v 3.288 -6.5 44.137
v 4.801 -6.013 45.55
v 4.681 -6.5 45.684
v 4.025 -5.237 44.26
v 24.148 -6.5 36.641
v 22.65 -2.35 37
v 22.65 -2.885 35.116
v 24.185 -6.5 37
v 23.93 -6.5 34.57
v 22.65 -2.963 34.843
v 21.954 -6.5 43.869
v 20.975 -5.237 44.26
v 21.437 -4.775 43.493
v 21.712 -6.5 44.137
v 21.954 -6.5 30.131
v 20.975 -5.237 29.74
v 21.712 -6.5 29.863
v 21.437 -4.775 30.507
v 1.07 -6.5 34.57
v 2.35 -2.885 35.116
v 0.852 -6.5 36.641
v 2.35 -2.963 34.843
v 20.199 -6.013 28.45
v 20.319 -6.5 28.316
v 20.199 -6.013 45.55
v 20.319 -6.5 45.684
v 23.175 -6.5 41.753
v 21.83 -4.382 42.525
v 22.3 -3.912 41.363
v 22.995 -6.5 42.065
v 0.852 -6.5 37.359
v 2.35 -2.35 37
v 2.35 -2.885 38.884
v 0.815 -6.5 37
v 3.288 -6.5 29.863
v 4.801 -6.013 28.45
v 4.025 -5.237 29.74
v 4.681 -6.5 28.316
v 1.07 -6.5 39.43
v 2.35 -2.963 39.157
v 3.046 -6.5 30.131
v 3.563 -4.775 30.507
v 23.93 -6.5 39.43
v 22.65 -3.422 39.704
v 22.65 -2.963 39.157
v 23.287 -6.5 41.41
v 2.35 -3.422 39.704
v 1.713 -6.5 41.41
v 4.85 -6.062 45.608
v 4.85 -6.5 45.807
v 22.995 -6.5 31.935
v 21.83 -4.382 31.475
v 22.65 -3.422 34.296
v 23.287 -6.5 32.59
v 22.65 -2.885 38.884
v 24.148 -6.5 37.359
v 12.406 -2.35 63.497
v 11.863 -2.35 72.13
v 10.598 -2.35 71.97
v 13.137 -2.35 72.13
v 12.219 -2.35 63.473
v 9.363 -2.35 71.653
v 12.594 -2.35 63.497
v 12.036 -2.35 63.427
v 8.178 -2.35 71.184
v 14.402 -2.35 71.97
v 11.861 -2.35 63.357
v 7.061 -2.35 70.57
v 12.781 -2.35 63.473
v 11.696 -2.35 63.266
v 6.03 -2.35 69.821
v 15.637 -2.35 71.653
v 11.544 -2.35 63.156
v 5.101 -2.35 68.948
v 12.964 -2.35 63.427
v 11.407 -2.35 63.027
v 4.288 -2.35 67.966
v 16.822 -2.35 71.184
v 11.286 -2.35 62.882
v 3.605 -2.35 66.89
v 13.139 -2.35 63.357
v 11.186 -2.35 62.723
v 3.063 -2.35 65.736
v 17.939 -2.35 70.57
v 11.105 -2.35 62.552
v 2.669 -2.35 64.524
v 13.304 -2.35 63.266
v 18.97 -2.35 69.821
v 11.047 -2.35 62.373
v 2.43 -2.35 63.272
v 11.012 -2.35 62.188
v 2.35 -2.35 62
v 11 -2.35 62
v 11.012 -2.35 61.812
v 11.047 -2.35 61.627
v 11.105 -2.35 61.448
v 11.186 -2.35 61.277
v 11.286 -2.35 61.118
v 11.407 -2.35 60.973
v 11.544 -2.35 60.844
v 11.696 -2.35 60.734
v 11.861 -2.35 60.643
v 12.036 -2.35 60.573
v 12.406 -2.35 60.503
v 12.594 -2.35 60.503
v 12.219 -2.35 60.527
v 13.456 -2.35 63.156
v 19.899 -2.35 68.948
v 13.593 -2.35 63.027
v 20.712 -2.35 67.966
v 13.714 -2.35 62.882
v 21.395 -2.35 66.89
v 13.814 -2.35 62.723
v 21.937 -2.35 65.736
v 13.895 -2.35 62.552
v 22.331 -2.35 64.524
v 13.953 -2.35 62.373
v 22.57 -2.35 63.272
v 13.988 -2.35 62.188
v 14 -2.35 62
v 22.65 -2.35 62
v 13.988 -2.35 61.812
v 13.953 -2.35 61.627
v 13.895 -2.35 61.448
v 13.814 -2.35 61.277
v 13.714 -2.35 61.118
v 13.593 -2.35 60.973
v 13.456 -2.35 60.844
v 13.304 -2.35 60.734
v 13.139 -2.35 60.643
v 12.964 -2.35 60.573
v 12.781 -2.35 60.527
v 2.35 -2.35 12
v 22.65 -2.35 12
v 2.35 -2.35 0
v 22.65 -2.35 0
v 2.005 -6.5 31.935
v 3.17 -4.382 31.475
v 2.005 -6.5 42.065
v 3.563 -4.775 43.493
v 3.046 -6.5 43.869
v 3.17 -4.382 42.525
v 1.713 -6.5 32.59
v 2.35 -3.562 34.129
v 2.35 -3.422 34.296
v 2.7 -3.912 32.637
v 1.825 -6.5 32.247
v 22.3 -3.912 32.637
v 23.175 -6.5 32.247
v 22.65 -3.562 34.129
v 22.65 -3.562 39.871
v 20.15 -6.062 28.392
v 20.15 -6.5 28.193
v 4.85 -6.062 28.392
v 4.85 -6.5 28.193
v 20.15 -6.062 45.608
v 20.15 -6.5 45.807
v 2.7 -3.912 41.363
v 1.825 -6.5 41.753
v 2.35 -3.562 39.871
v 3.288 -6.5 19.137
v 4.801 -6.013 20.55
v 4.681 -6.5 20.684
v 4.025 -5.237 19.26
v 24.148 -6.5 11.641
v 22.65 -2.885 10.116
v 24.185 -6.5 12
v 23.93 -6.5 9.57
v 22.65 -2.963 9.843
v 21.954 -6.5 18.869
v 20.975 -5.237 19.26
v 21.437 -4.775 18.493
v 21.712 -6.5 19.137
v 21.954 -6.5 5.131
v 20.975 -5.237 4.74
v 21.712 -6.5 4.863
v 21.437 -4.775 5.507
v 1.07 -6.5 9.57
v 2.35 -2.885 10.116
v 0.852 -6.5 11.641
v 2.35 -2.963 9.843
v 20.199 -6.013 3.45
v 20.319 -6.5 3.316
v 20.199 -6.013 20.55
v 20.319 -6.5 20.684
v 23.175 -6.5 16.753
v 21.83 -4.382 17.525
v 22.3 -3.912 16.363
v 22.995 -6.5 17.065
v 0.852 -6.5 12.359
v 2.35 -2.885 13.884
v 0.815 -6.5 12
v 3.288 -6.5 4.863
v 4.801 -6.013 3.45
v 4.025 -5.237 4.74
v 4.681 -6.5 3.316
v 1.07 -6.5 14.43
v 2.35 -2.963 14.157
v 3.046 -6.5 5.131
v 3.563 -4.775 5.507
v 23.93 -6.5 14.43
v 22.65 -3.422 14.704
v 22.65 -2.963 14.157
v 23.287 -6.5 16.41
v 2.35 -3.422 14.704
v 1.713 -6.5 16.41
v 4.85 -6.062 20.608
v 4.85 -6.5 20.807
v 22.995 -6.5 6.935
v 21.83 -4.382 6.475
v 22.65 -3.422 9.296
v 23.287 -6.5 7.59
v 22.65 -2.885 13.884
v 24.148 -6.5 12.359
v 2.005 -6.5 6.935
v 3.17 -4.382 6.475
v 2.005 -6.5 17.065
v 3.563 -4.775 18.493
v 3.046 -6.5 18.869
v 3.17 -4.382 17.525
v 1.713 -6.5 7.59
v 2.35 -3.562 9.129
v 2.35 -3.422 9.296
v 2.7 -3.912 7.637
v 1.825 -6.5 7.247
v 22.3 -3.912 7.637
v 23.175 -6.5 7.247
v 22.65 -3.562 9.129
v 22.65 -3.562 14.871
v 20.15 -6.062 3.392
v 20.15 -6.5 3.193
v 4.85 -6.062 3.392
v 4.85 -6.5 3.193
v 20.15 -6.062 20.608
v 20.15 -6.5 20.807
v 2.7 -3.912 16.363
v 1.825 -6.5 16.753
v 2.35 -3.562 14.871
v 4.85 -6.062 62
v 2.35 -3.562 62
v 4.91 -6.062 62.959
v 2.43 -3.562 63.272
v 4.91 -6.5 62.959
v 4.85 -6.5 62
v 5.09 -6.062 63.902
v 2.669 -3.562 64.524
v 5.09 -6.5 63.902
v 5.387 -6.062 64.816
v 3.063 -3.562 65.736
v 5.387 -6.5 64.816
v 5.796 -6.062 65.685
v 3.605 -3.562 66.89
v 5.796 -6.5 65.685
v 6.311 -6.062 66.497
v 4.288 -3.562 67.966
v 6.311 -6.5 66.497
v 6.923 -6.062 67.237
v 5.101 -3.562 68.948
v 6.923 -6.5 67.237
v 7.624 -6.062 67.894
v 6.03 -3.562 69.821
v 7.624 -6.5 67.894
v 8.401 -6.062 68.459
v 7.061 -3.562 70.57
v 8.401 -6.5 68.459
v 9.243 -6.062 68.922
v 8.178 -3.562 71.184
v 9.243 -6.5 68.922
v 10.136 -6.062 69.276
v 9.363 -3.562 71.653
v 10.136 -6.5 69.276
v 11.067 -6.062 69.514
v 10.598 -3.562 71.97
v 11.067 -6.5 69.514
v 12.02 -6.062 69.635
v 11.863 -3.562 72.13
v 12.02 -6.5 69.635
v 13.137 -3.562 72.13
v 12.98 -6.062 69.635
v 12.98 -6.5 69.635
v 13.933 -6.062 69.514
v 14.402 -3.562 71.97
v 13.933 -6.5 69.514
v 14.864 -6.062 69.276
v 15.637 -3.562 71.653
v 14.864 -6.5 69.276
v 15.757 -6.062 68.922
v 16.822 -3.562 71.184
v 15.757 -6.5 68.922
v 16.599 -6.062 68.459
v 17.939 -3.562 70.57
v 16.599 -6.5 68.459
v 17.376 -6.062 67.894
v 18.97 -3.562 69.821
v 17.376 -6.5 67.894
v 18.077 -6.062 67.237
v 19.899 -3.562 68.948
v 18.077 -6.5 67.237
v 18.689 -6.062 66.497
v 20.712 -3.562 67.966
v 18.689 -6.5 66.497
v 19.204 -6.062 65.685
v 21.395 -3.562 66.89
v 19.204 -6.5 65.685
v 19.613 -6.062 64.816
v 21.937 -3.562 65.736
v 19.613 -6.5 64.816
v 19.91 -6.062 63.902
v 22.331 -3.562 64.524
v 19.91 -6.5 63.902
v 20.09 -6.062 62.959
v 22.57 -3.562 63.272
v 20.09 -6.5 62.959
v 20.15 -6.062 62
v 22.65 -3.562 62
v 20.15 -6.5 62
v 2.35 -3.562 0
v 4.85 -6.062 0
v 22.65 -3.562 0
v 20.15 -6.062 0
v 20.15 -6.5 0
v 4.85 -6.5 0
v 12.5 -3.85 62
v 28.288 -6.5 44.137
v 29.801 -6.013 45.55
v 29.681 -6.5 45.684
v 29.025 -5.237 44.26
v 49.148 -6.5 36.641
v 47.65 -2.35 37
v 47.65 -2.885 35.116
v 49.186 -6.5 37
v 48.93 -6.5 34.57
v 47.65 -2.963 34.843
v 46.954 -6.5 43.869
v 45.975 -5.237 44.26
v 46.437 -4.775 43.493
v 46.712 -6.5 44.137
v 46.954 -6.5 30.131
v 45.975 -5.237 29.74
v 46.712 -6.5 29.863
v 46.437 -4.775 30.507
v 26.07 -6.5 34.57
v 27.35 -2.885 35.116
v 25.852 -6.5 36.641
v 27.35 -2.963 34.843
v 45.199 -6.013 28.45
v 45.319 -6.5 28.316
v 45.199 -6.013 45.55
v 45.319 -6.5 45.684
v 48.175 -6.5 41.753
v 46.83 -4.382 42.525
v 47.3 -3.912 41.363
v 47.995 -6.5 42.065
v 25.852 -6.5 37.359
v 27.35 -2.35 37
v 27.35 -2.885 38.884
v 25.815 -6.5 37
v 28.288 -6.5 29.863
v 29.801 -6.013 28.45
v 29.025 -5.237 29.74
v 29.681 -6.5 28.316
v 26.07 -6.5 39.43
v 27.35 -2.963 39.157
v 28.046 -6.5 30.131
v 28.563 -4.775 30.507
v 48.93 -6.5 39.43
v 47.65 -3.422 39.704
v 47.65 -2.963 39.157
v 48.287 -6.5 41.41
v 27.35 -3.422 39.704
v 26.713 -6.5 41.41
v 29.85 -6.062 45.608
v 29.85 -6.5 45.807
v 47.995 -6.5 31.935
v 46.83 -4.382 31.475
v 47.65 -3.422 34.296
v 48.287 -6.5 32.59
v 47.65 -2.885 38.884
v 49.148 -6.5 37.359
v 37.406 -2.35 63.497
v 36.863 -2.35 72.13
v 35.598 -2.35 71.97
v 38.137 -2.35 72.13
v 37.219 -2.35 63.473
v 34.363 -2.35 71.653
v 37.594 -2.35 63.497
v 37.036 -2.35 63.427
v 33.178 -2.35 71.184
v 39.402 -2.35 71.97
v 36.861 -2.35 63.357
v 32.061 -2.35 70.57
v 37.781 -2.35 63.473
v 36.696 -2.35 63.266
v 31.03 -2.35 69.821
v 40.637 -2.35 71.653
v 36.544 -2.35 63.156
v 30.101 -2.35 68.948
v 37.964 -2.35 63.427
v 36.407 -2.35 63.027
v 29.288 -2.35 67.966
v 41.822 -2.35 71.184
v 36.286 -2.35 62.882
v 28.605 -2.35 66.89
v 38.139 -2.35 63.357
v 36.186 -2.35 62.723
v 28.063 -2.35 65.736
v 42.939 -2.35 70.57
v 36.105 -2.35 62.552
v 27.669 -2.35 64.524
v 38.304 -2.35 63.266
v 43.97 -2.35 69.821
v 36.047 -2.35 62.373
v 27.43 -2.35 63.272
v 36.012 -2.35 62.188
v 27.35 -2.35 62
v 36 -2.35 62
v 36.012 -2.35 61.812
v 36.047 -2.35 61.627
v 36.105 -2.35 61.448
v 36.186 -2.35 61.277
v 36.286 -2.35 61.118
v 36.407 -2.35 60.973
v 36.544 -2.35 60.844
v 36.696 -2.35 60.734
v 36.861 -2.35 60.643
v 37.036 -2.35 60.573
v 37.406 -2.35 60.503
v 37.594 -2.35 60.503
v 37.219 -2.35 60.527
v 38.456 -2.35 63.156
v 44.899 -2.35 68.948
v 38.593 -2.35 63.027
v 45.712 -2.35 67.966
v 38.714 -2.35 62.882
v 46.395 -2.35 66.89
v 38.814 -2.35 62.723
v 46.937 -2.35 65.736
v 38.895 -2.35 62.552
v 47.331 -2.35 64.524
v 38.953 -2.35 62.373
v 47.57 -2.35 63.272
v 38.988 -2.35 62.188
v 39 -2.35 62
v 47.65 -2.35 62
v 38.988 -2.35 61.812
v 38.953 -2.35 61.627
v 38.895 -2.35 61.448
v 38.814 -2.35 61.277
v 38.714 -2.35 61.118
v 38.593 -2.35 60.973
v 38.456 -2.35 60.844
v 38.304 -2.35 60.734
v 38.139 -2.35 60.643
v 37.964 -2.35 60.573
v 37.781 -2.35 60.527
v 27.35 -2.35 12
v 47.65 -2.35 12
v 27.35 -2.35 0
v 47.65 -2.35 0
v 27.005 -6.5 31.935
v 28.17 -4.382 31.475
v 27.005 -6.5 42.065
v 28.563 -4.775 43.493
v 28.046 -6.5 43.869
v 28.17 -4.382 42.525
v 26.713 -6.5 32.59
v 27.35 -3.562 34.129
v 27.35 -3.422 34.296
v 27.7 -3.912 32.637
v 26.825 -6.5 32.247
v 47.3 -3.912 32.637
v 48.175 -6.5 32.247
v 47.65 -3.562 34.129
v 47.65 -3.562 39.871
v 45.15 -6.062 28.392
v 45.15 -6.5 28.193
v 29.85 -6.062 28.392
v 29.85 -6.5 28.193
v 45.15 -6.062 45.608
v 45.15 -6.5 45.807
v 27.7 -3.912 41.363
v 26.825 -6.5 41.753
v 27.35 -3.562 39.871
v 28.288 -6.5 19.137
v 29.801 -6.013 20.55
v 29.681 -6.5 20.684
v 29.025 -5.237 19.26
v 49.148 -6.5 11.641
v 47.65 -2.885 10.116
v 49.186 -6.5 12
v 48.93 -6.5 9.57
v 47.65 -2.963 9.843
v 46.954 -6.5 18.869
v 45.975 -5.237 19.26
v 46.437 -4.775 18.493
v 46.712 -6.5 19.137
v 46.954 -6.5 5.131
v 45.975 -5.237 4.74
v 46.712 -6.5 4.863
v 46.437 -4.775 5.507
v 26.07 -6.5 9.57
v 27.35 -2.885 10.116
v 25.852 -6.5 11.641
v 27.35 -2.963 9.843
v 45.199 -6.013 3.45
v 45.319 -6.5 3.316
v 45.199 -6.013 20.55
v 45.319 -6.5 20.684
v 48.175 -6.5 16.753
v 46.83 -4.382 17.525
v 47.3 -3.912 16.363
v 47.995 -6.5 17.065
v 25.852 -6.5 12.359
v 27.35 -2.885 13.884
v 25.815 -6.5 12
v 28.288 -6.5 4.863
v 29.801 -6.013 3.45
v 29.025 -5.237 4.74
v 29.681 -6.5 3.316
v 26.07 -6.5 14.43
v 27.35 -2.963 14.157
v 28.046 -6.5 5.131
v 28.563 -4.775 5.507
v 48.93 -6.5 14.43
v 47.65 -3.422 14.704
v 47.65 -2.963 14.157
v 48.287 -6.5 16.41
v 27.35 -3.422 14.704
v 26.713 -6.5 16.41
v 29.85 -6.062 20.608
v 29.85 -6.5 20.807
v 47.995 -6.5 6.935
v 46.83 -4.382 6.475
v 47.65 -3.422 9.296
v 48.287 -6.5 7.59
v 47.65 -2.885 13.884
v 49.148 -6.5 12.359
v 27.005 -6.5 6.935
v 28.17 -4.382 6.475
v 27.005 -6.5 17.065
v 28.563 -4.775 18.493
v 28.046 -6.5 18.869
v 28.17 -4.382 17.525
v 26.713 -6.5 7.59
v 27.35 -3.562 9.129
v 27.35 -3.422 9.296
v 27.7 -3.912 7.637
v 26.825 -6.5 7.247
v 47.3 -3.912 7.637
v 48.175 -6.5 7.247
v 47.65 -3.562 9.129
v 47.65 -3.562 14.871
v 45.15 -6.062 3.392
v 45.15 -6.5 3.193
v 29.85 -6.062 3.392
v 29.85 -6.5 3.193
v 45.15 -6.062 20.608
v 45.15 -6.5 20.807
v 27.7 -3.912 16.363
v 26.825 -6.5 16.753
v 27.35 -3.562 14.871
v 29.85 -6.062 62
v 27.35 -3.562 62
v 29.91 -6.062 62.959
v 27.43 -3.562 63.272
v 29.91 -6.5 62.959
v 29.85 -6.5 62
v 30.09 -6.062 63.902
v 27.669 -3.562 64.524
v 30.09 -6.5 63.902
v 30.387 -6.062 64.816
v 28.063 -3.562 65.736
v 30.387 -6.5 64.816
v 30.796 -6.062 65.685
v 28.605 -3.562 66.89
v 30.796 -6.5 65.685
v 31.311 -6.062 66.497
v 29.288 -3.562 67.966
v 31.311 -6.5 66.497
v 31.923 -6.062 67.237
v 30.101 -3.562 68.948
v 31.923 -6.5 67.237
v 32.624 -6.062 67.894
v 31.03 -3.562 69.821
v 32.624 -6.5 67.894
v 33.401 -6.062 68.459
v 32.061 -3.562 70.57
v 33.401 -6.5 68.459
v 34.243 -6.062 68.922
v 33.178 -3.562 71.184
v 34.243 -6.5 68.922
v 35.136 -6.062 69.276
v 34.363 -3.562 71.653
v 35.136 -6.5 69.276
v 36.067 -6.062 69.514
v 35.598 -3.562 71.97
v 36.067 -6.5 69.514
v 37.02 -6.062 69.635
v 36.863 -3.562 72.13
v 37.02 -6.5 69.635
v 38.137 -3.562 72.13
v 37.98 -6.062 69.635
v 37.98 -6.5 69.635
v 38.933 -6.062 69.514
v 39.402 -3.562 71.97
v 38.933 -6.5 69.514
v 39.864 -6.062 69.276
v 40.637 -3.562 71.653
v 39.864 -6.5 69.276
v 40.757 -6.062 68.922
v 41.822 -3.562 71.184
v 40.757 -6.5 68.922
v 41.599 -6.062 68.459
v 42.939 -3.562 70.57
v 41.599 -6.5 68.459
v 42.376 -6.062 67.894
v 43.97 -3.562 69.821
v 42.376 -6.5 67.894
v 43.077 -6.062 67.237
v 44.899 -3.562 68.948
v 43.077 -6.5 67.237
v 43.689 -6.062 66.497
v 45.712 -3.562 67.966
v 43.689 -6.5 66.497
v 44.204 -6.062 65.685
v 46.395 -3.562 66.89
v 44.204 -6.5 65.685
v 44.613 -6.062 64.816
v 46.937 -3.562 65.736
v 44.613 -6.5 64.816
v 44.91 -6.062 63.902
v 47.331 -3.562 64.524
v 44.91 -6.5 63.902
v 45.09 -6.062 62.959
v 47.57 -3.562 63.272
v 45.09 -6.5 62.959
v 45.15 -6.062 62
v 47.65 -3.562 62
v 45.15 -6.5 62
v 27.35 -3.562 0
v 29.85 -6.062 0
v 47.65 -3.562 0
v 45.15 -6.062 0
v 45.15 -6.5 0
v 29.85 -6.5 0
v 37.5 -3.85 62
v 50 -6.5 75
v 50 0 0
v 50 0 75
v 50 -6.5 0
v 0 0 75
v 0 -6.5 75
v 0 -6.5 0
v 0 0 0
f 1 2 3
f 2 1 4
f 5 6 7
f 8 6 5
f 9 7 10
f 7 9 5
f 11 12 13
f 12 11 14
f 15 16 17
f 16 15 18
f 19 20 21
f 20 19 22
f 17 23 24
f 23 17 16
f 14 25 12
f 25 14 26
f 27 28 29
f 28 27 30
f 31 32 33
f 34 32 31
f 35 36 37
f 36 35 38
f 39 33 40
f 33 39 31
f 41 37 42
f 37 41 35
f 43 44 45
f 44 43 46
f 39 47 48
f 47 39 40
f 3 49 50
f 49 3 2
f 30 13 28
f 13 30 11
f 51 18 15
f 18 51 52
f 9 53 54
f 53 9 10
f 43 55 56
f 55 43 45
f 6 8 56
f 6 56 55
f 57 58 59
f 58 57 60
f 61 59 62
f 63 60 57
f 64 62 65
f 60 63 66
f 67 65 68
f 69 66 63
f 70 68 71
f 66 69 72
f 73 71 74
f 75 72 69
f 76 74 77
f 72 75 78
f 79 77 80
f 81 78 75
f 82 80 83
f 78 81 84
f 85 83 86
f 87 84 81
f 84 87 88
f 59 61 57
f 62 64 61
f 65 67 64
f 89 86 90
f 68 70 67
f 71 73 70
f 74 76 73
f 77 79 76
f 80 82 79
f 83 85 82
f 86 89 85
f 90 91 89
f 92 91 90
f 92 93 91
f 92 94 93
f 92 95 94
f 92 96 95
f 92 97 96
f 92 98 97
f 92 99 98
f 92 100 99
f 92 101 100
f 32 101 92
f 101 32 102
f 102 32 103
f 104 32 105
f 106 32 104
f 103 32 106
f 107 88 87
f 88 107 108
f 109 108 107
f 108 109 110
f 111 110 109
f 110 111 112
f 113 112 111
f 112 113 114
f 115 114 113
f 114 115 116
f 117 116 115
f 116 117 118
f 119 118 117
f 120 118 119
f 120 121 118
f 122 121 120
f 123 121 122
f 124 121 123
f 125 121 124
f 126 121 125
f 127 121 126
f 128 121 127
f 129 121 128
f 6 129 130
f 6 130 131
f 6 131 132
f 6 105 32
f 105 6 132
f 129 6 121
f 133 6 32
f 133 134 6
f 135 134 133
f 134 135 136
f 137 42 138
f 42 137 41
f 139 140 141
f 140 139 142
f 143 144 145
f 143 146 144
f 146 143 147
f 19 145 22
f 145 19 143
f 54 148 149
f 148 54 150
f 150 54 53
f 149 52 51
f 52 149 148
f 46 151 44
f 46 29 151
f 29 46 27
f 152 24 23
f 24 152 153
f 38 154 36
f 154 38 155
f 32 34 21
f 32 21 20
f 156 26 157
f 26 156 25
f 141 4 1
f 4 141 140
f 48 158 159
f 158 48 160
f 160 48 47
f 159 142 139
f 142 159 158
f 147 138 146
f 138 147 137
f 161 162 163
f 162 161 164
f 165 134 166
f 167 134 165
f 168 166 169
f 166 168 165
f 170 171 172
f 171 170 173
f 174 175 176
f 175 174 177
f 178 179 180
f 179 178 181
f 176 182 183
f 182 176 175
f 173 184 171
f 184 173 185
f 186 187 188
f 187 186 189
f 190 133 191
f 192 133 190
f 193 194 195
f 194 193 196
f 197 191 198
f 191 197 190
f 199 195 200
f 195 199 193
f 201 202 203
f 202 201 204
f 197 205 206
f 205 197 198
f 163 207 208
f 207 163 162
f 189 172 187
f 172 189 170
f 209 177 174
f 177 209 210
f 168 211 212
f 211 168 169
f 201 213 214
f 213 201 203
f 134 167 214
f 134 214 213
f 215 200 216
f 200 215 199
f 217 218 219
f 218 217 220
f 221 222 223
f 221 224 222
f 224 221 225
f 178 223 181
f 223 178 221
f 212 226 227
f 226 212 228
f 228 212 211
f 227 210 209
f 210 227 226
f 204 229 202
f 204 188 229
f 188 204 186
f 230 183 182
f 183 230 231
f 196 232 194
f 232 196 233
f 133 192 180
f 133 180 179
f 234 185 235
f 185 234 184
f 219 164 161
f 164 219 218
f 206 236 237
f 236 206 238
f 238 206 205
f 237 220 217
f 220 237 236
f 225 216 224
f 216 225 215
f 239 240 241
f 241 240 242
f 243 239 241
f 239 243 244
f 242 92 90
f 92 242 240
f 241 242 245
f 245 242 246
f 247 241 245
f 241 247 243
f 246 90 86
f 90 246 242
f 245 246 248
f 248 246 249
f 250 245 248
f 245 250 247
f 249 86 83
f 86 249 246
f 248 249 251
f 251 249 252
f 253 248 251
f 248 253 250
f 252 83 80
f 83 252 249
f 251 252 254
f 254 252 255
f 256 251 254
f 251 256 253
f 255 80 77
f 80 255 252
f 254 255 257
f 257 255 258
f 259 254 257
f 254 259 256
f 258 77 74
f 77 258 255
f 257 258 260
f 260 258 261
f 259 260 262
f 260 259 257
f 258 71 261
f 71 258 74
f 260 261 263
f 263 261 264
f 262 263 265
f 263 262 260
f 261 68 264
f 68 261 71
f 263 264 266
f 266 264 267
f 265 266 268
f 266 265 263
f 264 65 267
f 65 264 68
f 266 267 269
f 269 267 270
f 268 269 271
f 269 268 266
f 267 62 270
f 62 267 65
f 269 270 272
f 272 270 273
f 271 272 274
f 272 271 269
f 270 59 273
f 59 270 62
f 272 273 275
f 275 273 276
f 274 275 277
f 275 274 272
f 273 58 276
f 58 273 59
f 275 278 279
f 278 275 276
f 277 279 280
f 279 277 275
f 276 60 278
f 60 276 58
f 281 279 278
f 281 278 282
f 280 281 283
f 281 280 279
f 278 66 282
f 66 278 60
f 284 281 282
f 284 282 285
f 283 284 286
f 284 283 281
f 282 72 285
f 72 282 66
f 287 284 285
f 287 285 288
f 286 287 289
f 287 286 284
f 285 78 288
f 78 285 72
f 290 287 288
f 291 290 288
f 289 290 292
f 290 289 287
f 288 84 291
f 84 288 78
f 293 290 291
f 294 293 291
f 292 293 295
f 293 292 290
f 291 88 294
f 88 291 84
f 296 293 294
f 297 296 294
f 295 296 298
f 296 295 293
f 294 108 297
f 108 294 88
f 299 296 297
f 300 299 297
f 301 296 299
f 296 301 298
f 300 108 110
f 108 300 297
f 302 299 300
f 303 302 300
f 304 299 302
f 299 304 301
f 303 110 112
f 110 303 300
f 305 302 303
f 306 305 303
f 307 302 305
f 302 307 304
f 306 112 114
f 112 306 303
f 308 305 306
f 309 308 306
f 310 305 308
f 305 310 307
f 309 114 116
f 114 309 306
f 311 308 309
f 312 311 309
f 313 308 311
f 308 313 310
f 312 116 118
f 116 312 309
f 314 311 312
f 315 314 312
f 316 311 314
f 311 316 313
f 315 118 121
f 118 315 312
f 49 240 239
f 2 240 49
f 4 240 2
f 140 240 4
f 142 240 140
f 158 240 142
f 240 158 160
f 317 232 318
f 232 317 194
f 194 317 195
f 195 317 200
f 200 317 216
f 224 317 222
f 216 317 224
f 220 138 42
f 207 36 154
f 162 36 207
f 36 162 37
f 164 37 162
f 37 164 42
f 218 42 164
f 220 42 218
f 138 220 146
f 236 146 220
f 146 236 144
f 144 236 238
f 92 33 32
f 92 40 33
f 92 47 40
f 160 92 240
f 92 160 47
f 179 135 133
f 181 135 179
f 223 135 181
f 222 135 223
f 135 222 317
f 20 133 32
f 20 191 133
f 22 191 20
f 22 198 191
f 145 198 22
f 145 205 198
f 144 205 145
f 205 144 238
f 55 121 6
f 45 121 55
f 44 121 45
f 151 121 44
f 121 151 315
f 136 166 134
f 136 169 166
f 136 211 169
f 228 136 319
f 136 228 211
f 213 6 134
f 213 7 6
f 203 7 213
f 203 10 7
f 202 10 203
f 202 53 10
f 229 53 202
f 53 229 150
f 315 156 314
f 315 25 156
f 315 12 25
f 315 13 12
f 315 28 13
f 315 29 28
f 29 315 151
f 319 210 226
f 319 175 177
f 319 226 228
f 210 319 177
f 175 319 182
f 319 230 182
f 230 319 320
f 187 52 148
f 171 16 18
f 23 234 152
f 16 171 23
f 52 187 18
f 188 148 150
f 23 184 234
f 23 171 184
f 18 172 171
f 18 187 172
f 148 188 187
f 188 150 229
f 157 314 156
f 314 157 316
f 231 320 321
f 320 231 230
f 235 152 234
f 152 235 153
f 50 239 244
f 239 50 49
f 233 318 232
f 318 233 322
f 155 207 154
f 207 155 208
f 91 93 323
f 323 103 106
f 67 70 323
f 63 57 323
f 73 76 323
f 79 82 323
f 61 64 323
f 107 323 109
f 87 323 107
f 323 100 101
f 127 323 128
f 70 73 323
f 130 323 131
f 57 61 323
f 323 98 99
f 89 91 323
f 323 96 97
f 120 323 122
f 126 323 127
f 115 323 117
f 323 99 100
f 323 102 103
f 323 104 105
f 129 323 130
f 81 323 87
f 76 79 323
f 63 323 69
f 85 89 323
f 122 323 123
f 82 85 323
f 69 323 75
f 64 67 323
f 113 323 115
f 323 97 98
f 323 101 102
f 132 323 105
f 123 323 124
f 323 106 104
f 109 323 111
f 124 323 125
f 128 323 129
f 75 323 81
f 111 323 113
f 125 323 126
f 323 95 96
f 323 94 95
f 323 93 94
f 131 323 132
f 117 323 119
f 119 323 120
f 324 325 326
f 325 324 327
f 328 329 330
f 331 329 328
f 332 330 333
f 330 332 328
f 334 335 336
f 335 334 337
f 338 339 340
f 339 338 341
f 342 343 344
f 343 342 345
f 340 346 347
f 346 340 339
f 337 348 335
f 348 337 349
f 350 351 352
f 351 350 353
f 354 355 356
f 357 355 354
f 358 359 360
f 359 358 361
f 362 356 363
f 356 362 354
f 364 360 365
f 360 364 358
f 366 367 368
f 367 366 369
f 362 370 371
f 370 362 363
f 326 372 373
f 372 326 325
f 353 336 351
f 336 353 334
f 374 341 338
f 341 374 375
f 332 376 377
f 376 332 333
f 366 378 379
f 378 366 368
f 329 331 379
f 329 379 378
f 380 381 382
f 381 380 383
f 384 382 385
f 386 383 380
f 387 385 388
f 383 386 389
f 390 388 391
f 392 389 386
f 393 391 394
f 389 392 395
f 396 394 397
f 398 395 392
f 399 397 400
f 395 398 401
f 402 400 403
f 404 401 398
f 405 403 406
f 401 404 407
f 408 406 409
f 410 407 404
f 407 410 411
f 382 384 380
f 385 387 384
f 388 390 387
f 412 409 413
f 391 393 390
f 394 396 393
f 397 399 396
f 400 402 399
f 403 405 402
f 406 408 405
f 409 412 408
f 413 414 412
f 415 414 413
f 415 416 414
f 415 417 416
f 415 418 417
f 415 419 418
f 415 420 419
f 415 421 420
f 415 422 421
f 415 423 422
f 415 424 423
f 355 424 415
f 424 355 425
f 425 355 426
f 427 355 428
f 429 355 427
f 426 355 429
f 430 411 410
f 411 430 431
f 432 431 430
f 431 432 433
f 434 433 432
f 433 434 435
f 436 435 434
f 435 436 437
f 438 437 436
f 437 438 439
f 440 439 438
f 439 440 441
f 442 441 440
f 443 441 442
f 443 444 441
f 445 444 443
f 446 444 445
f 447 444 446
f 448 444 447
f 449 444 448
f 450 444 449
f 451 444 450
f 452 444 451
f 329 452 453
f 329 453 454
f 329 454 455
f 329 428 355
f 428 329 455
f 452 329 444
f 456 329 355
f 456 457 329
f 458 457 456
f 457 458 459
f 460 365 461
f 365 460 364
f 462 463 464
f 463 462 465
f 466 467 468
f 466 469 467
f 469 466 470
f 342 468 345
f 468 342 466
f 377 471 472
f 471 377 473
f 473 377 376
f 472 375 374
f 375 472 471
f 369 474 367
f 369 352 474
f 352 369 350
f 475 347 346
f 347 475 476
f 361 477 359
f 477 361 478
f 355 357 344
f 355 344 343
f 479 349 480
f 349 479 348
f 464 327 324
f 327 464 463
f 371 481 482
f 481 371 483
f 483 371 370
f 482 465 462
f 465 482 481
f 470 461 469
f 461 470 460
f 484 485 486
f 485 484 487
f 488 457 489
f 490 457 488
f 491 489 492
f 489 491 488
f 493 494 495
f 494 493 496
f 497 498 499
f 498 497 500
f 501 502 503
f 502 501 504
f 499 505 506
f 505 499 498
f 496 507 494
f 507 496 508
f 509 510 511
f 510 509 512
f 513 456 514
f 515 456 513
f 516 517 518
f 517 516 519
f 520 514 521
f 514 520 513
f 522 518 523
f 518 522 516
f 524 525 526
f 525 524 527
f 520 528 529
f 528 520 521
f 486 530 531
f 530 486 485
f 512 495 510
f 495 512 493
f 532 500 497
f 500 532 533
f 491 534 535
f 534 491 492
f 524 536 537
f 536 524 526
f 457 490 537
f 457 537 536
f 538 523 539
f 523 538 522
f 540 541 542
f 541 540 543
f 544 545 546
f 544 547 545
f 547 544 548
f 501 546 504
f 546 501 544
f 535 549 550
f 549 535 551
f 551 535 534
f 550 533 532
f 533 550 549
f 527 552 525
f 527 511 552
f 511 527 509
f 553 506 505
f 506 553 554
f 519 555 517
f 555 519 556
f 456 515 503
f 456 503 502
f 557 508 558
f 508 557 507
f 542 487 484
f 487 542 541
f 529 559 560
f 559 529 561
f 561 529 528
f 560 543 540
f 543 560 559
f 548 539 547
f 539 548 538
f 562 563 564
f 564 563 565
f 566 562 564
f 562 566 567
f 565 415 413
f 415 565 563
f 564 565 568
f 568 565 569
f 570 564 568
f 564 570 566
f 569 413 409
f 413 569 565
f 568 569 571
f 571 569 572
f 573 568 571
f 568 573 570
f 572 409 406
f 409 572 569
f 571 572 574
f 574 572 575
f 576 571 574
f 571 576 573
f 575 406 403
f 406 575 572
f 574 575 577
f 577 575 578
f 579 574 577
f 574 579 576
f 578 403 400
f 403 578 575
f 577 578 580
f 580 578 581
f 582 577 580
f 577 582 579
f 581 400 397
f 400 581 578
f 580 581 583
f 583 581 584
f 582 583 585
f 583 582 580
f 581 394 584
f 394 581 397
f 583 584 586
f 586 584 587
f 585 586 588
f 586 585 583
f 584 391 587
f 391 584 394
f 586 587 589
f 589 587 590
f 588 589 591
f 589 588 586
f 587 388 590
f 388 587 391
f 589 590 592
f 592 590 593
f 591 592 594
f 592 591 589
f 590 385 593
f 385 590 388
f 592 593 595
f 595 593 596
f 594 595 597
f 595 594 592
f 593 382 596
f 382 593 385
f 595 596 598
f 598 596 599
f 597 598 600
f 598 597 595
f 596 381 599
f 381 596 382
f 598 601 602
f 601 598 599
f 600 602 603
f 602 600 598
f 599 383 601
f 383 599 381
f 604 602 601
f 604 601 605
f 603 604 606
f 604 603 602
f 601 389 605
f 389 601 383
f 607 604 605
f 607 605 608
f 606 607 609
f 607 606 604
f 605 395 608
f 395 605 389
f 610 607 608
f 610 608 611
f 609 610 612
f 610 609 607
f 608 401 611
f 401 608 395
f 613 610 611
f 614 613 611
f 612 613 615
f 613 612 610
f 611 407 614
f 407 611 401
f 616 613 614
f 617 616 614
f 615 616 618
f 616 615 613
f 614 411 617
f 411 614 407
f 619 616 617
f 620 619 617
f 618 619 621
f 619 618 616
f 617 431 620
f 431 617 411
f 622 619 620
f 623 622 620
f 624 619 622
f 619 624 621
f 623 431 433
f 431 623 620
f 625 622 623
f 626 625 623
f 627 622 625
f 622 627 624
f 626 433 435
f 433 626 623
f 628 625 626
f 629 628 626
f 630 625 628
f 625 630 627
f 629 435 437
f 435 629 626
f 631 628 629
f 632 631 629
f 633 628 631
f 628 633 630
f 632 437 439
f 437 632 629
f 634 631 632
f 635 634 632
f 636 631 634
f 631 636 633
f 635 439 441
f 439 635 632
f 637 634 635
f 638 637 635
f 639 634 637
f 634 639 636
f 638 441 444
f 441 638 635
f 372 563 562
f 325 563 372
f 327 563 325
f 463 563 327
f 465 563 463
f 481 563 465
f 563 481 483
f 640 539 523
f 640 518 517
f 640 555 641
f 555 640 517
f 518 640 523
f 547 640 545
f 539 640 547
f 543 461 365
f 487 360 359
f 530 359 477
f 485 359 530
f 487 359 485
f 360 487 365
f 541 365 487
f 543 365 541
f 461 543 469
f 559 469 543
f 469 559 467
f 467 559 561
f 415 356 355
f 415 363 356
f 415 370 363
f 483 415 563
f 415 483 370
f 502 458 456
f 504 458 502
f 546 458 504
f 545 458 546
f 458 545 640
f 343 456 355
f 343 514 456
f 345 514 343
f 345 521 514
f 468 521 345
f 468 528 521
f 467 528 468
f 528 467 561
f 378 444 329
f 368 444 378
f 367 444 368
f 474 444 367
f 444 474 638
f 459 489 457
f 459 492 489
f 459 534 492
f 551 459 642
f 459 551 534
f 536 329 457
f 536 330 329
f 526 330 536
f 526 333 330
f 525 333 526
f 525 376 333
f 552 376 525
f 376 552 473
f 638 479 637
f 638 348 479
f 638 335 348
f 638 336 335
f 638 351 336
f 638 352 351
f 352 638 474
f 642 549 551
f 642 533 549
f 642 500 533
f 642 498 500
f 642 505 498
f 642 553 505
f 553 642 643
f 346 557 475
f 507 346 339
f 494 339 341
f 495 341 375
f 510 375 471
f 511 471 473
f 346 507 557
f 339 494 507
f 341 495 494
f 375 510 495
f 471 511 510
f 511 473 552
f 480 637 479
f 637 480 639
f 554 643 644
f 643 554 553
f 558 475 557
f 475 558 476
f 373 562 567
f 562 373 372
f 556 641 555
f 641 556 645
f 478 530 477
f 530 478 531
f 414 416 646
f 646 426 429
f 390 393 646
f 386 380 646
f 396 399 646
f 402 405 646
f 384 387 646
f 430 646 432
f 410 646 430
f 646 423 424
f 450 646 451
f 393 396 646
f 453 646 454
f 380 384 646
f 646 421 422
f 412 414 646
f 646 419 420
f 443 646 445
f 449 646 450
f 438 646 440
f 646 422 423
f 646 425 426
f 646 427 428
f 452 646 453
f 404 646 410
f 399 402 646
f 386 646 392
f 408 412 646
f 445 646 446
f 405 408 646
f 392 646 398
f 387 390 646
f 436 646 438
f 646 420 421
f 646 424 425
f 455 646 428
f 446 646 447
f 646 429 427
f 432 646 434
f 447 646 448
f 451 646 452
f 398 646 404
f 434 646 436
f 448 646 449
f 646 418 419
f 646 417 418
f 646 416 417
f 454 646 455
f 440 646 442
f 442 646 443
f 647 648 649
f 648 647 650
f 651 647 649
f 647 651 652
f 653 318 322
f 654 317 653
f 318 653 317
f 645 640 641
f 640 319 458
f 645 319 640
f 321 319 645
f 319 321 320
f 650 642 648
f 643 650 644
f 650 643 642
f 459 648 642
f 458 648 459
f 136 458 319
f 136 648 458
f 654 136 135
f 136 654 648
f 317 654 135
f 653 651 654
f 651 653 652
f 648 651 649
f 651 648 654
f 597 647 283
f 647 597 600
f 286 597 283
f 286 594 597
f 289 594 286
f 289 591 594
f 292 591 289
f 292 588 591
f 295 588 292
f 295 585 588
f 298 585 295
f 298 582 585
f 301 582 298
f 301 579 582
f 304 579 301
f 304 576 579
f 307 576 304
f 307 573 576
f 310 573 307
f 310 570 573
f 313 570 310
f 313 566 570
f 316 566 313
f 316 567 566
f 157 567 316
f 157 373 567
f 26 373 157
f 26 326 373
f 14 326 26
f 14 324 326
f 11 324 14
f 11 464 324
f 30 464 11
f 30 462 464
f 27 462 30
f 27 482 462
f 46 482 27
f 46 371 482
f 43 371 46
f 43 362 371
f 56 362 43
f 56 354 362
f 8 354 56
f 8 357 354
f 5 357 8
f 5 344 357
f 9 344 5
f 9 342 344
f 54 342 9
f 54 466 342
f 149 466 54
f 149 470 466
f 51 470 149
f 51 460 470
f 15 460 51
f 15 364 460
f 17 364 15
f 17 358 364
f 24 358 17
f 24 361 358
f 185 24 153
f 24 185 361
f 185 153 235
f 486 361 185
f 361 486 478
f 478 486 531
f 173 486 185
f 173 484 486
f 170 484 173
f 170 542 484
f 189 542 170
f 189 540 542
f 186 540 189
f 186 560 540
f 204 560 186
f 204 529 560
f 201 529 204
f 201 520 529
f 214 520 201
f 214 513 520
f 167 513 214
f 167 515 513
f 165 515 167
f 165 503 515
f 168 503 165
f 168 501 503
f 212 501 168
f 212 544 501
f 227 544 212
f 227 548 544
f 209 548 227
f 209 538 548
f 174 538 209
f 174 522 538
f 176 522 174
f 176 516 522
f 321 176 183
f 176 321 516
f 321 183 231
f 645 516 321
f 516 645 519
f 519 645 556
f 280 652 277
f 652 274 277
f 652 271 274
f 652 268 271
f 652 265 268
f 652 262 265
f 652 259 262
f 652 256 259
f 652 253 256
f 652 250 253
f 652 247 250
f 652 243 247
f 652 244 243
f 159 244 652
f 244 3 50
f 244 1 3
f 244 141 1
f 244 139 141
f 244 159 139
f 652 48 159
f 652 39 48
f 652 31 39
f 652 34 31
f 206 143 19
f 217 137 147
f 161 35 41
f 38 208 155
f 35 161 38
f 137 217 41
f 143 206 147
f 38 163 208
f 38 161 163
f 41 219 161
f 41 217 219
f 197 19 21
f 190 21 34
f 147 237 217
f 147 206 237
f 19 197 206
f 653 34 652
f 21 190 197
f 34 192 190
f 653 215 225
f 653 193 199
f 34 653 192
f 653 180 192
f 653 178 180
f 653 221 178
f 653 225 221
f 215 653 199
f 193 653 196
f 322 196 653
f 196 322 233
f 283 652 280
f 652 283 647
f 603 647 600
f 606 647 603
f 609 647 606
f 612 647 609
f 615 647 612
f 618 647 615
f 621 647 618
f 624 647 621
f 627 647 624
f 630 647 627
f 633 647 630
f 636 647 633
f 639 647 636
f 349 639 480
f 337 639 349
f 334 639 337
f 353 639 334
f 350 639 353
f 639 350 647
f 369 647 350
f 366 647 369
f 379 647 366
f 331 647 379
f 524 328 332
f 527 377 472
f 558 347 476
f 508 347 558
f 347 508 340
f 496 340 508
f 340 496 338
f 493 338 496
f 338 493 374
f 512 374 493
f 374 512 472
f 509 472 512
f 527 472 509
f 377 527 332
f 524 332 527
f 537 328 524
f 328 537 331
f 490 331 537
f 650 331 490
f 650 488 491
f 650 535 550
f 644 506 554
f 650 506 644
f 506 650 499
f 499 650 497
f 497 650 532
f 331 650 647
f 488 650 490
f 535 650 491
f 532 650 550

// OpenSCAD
/*This file is the master copy of the multiconnect slot back. 
All components of this file are required in any file using this backer
*/

totalWidth = 50;
totalHeight = 75;

/*[Slot Customization]*/
//Distance between Multiconnect slots on the back (25mm is standard for MultiBoard)
distanceBetweenSlots = 25;
//QuickRelease removes the small indent in the top of the slots that lock the part into place
slotQuickRelease = false;
//Dimple scale tweaks the size of the dimple in the slot for printers that need a larger dimple to print correctly
dimpleScale = 1; //[0.5:.05:1.5]
//Scale the size of slots in the back (1.015 scale is default for a tight fit. Increase if your finding poor fit. )
slotTolerance = 1.00; //[0.925:0.005:1.075]
//Move the slot in (positive) or out (negative)
slotDepthMicroadjustment = 0; //[-.5:0.05:.5]
//enable a slot on-ramp for easy mounting of tall items
onRampEnabled = true;
//frequency of slots for on-ramp. 1 = every slot; 2 = every 2 slots; etc.
onRampEveryXSlots = 1;

/* [Hidden] */

multiconnectBack(backWidth = totalWidth, backHeight = totalHeight, distanceBetweenSlots = distanceBetweenSlots);

//BEGIN MODULES
//Slotted back Module
module multiconnectBack(backWidth, backHeight, distanceBetweenSlots)
{
    //slot count calculates how many slots can fit on the back. Based on internal width for buffer. 
    //slot width needs to be at least the distance between slot for at least 1 slot to generate
    let (backWidth = max(backWidth,distanceBetweenSlots), backHeight = max(backHeight, 25),slotCount = floor(backWidth/distanceBetweenSlots), backThickness = 6.5){
        difference() {
            translate(v = [0,-backThickness,0]) cube(size = [backWidth,backThickness,backHeight]);
            //Loop through slots and center on the item
            //Note: I kept doing math until it looked right. It's possible this can be simplified.
            for (slotNum = [0:1:slotCount-1]) {
                translate(v = [distanceBetweenSlots/2+(backWidth/distanceBetweenSlots-slotCount)*distanceBetweenSlots/2+slotNum*distanceBetweenSlots,-2.35+slotDepthMicroadjustment,backHeight-13]) {
                    color(c = "red")  slotTool(backHeight);
                }
            }
        }
    }
    //Create Slot Tool
    module slotTool(totalHeight) {
        scale(v = slotTolerance)
        //slot minus optional dimple with optional on-ramp
        let (slotProfile = [[0,0],[10.15,0],[10.15,1.2121],[7.65,3.712],[7.65,5],[0,5]])
        difference() {
            union() {
                //round top
                rotate(a = [90,0,0,]) 
                    rotate_extrude($fn=50) 
                        polygon(points = slotProfile);
                //long slot
                translate(v = [0,0,0]) 
                    rotate(a = [180,0,0]) 
                    linear_extrude(height = totalHeight+1) 
                        union(){
                            polygon(points = slotProfile);
                            mirror([1,0,0])
                                polygon(points = slotProfile);
                        }
                //on-ramp
                if(onRampEnabled)
                    for(y = [1:onRampEveryXSlots:totalHeight/distanceBetweenSlots])
                        translate(v = [0,-5,-y*distanceBetweenSlots]) 
                            rotate(a = [-90,0,0]) 
                                color(c = "orange") cylinder(h = 5, r1 = 12, r2 = 10.15);
            }
            //dimple
            if (slotQuickRelease == false)
                scale(v = dimpleScale) 
                rotate(a = [90,0,0,]) 
                    rotate_extrude($fn=50) 
                        polygon(points = [[0,0],[0,1.5],[1.5,0]]);
        }
    }
}
